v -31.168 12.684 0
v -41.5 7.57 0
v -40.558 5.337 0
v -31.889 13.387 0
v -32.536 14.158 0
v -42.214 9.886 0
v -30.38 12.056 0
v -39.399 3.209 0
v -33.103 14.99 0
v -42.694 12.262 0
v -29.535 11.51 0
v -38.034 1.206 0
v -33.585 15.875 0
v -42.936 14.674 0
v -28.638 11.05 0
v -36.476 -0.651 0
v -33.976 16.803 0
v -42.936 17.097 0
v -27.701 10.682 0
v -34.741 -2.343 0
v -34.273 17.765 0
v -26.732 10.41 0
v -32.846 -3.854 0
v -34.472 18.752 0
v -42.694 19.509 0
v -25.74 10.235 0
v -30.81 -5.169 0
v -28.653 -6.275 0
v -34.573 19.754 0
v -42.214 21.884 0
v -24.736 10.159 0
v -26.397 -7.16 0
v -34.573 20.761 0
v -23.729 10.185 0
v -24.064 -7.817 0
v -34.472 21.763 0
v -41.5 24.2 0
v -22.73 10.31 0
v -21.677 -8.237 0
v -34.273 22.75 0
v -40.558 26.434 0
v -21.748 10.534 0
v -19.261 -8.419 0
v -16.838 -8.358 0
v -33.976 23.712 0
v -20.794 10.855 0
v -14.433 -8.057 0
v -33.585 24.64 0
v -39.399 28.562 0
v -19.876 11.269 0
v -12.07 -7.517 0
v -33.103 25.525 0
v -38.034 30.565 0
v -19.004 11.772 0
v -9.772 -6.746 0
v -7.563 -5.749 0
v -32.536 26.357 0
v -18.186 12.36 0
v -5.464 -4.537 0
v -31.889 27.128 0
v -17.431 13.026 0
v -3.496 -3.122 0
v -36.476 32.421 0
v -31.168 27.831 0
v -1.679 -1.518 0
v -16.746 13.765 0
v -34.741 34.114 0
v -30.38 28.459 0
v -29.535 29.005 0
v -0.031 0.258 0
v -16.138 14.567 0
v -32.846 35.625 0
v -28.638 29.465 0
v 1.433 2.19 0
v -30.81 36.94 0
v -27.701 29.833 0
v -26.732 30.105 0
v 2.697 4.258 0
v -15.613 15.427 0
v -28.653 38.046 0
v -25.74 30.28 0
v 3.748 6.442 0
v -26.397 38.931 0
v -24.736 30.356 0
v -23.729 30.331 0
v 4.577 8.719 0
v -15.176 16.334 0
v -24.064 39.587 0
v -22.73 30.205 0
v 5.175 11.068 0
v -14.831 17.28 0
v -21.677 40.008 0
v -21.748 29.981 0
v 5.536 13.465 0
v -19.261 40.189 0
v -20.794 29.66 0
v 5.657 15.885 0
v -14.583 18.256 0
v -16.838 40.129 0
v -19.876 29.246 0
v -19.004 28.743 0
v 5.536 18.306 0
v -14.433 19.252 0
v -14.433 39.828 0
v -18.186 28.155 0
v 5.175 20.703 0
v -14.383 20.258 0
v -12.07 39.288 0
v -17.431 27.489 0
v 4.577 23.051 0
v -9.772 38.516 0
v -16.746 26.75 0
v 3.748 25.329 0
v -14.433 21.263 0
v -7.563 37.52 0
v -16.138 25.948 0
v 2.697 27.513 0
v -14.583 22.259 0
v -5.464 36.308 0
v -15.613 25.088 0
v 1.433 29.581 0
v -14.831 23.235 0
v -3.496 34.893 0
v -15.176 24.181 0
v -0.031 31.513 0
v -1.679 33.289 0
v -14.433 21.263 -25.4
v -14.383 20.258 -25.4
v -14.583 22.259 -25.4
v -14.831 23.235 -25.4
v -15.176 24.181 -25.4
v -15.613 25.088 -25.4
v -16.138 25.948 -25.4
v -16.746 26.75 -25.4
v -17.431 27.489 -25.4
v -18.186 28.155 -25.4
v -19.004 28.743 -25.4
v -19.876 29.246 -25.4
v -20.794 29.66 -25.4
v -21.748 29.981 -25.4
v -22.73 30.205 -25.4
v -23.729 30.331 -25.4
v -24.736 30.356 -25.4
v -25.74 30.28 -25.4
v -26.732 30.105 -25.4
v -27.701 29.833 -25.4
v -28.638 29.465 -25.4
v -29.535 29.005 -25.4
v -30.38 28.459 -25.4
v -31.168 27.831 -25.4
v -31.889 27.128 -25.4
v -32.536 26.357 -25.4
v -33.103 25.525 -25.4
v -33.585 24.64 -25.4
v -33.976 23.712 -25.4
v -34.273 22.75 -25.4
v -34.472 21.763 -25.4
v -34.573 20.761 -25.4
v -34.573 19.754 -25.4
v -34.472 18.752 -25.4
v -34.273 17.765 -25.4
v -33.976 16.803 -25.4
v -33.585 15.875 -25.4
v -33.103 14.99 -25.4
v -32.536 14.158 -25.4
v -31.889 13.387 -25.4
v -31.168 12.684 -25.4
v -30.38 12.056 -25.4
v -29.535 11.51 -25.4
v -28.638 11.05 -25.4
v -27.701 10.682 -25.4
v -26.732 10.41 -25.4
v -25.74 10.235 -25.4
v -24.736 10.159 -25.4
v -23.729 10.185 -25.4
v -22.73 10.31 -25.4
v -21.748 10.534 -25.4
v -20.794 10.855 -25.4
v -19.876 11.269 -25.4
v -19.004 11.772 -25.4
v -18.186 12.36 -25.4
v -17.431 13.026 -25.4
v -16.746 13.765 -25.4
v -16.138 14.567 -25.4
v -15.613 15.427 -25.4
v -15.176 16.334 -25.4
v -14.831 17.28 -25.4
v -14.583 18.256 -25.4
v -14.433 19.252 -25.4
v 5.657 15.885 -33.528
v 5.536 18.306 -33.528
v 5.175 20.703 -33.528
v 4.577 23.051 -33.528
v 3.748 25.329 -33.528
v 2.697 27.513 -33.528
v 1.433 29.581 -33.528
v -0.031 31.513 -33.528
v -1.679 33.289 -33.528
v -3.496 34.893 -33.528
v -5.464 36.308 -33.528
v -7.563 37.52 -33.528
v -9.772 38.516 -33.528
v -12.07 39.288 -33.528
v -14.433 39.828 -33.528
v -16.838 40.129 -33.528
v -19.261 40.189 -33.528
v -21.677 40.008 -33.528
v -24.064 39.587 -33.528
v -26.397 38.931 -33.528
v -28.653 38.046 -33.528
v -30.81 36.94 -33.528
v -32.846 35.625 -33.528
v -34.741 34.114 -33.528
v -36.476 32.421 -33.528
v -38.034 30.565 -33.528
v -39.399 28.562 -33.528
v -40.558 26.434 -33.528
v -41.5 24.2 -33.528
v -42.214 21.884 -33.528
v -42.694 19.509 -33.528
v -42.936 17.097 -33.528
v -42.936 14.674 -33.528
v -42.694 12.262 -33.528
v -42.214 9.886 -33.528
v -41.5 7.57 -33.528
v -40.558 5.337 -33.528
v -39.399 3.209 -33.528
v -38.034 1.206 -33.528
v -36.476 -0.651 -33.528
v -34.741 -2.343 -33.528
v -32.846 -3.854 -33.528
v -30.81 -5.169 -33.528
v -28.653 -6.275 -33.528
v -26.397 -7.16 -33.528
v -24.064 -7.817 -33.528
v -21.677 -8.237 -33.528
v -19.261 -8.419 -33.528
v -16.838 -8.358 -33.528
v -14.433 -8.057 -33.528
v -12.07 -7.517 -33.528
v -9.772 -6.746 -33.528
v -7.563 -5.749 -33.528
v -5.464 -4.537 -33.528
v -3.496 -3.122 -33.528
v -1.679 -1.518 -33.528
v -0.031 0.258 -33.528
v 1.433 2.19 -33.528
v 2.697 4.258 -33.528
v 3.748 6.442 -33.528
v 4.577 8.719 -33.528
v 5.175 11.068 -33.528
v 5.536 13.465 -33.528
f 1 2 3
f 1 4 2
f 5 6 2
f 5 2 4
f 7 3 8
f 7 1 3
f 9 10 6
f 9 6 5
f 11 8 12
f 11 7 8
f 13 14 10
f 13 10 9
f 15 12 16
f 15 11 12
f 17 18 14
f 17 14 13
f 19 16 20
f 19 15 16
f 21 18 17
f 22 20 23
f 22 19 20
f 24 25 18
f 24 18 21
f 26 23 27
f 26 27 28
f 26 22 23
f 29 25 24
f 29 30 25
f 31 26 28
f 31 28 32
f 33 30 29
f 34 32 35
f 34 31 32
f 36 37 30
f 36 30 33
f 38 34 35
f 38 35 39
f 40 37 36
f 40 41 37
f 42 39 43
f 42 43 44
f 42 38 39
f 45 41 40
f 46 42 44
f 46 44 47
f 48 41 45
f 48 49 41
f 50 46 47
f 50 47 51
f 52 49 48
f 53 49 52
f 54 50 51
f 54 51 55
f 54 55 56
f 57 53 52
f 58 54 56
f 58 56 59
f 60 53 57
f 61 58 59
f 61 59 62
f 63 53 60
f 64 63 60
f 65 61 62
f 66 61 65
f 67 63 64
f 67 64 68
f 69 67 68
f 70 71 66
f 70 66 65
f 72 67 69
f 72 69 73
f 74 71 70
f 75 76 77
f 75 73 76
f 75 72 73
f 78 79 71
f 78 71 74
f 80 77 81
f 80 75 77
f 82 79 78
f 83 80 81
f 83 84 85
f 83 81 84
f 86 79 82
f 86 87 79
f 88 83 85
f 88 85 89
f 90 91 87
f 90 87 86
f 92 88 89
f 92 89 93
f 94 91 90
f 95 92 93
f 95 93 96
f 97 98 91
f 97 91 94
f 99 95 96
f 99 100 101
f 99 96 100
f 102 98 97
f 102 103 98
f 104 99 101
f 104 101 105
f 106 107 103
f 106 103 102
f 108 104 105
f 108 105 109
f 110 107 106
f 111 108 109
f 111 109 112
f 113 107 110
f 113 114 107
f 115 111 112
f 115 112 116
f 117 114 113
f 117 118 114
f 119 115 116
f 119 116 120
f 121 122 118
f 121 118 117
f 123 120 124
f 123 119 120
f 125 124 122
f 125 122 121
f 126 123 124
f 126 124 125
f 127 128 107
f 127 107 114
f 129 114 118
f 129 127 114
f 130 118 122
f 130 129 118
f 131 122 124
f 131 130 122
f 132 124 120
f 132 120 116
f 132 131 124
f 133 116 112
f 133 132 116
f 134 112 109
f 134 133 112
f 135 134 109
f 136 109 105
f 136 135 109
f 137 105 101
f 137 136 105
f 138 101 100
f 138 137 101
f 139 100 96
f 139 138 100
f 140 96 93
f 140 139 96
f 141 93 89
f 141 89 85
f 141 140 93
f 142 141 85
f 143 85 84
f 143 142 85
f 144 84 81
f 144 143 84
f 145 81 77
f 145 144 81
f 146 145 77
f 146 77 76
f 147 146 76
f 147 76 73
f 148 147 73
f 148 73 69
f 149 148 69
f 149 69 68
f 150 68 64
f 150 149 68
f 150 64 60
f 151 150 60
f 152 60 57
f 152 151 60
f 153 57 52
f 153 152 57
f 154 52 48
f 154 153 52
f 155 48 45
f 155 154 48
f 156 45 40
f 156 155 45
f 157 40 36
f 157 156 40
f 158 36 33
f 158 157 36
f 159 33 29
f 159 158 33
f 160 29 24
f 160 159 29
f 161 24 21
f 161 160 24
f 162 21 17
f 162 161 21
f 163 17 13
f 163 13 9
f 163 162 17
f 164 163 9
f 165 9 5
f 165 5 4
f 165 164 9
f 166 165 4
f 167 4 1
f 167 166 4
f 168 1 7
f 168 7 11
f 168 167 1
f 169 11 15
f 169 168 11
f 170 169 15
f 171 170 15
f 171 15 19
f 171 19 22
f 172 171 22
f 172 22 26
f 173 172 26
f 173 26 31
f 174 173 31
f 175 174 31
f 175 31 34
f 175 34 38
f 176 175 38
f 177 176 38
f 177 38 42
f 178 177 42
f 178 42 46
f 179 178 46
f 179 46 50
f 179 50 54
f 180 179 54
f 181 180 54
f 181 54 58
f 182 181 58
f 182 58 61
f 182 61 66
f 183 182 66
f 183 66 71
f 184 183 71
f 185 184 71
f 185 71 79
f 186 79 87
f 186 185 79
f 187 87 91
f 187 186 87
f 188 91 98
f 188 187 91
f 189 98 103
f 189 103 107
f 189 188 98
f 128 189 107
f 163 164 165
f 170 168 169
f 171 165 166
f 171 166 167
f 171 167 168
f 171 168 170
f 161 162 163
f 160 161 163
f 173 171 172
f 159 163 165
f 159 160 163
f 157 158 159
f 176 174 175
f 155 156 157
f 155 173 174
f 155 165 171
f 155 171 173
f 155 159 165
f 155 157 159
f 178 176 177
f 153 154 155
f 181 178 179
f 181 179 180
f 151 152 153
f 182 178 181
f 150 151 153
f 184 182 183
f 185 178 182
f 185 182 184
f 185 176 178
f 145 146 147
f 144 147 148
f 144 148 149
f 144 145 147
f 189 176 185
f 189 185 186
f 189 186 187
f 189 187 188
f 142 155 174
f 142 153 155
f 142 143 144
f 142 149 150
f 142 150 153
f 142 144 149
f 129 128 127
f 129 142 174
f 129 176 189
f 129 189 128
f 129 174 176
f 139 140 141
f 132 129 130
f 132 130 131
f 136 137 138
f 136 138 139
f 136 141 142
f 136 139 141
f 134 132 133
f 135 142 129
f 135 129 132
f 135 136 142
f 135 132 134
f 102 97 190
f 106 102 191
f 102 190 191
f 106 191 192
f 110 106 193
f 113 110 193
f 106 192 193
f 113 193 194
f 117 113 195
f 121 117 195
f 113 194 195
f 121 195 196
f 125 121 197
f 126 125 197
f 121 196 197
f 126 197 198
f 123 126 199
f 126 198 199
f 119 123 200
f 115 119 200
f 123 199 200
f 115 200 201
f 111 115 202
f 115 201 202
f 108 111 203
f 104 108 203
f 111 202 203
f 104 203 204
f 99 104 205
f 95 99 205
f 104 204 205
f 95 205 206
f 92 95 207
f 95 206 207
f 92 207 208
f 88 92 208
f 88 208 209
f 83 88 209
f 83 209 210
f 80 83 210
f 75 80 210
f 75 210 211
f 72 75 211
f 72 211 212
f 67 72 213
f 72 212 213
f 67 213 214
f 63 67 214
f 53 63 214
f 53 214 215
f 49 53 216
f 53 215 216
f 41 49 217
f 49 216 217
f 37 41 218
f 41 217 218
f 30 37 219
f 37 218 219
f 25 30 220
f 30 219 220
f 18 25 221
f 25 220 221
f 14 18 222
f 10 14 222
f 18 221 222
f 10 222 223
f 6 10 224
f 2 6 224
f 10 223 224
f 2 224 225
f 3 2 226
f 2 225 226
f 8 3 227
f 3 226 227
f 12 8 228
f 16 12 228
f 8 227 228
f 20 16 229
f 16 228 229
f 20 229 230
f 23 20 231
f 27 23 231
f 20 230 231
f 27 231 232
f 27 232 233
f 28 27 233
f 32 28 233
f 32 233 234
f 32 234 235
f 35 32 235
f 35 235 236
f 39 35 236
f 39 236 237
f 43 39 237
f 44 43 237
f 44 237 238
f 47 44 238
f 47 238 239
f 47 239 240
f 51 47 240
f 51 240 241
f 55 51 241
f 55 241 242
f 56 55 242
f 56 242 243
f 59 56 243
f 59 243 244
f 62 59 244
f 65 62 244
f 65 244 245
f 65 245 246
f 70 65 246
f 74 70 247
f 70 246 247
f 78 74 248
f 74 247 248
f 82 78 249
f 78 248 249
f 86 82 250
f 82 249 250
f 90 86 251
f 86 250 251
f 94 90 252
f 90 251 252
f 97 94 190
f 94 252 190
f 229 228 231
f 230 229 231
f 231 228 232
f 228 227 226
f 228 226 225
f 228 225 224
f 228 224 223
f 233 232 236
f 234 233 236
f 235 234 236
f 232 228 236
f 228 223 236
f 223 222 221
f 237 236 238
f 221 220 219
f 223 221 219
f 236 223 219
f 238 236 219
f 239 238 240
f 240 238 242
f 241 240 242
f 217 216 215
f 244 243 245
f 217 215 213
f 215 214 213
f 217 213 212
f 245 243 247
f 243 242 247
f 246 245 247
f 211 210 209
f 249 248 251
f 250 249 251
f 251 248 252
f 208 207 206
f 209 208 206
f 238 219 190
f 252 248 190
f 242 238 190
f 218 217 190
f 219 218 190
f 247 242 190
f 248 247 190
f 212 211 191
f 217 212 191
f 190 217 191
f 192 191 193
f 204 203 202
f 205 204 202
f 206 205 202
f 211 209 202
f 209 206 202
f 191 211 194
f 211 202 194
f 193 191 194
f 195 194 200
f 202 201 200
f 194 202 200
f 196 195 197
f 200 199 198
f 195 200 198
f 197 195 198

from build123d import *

# Parameters (mm, degrees)
F0_R      = 24.311566
F1_DEPTH  = 33.528
F2_R      = 24.311566
F2_R_2    = 6.595336
F1_FACE_R = 24.311566
F3_DEPTH  = 25.4
F4_R      = 24.311566
F4_R_2    = 10.101211
F5_DEPTH  = 25.4


with BuildPart() as f1:
    # F0 (on Top) → F1 (new body)
    with BuildSketch(Plane.XY):
        with Locations((-18.654427, 15.885411)):
            Circle(F0_R)
    extrude(amount=-F1_DEPTH)

    # F2 (on face) + F1_face (on face) → F3 (cut)
    with BuildSketch(Plane.XY):
        with Locations((-18.654427, 15.885411)):
            Circle(F2_R)
        with Locations((-23.900984, 19.966066)):
            Circle(F2_R_2, mode=Mode.SUBTRACT)
        with Locations((-23.900984, 19.966066)):
            Circle(F2_R_2)
    with BuildSketch(Plane(origin=(-18.654427, 15.885411, 0), x_dir=(1, 0, 0), z_dir=(0, 0, 1))):
        Circle(F1_FACE_R)
    extrude(amount=-F3_DEPTH, mode=Mode.SUBTRACT)

    # F4 (on face) → F5 (join)
    with BuildSketch(Plane.XY.offset(-25.4)):
        with Locations((-18.654427, 15.885411)):
            Circle(F4_R)
        with Locations((-24.483934, 20.257542)):
            Circle(F4_R_2, mode=Mode.SUBTRACT)
    extrude(amount=F5_DEPTH)


solid = f1.part
